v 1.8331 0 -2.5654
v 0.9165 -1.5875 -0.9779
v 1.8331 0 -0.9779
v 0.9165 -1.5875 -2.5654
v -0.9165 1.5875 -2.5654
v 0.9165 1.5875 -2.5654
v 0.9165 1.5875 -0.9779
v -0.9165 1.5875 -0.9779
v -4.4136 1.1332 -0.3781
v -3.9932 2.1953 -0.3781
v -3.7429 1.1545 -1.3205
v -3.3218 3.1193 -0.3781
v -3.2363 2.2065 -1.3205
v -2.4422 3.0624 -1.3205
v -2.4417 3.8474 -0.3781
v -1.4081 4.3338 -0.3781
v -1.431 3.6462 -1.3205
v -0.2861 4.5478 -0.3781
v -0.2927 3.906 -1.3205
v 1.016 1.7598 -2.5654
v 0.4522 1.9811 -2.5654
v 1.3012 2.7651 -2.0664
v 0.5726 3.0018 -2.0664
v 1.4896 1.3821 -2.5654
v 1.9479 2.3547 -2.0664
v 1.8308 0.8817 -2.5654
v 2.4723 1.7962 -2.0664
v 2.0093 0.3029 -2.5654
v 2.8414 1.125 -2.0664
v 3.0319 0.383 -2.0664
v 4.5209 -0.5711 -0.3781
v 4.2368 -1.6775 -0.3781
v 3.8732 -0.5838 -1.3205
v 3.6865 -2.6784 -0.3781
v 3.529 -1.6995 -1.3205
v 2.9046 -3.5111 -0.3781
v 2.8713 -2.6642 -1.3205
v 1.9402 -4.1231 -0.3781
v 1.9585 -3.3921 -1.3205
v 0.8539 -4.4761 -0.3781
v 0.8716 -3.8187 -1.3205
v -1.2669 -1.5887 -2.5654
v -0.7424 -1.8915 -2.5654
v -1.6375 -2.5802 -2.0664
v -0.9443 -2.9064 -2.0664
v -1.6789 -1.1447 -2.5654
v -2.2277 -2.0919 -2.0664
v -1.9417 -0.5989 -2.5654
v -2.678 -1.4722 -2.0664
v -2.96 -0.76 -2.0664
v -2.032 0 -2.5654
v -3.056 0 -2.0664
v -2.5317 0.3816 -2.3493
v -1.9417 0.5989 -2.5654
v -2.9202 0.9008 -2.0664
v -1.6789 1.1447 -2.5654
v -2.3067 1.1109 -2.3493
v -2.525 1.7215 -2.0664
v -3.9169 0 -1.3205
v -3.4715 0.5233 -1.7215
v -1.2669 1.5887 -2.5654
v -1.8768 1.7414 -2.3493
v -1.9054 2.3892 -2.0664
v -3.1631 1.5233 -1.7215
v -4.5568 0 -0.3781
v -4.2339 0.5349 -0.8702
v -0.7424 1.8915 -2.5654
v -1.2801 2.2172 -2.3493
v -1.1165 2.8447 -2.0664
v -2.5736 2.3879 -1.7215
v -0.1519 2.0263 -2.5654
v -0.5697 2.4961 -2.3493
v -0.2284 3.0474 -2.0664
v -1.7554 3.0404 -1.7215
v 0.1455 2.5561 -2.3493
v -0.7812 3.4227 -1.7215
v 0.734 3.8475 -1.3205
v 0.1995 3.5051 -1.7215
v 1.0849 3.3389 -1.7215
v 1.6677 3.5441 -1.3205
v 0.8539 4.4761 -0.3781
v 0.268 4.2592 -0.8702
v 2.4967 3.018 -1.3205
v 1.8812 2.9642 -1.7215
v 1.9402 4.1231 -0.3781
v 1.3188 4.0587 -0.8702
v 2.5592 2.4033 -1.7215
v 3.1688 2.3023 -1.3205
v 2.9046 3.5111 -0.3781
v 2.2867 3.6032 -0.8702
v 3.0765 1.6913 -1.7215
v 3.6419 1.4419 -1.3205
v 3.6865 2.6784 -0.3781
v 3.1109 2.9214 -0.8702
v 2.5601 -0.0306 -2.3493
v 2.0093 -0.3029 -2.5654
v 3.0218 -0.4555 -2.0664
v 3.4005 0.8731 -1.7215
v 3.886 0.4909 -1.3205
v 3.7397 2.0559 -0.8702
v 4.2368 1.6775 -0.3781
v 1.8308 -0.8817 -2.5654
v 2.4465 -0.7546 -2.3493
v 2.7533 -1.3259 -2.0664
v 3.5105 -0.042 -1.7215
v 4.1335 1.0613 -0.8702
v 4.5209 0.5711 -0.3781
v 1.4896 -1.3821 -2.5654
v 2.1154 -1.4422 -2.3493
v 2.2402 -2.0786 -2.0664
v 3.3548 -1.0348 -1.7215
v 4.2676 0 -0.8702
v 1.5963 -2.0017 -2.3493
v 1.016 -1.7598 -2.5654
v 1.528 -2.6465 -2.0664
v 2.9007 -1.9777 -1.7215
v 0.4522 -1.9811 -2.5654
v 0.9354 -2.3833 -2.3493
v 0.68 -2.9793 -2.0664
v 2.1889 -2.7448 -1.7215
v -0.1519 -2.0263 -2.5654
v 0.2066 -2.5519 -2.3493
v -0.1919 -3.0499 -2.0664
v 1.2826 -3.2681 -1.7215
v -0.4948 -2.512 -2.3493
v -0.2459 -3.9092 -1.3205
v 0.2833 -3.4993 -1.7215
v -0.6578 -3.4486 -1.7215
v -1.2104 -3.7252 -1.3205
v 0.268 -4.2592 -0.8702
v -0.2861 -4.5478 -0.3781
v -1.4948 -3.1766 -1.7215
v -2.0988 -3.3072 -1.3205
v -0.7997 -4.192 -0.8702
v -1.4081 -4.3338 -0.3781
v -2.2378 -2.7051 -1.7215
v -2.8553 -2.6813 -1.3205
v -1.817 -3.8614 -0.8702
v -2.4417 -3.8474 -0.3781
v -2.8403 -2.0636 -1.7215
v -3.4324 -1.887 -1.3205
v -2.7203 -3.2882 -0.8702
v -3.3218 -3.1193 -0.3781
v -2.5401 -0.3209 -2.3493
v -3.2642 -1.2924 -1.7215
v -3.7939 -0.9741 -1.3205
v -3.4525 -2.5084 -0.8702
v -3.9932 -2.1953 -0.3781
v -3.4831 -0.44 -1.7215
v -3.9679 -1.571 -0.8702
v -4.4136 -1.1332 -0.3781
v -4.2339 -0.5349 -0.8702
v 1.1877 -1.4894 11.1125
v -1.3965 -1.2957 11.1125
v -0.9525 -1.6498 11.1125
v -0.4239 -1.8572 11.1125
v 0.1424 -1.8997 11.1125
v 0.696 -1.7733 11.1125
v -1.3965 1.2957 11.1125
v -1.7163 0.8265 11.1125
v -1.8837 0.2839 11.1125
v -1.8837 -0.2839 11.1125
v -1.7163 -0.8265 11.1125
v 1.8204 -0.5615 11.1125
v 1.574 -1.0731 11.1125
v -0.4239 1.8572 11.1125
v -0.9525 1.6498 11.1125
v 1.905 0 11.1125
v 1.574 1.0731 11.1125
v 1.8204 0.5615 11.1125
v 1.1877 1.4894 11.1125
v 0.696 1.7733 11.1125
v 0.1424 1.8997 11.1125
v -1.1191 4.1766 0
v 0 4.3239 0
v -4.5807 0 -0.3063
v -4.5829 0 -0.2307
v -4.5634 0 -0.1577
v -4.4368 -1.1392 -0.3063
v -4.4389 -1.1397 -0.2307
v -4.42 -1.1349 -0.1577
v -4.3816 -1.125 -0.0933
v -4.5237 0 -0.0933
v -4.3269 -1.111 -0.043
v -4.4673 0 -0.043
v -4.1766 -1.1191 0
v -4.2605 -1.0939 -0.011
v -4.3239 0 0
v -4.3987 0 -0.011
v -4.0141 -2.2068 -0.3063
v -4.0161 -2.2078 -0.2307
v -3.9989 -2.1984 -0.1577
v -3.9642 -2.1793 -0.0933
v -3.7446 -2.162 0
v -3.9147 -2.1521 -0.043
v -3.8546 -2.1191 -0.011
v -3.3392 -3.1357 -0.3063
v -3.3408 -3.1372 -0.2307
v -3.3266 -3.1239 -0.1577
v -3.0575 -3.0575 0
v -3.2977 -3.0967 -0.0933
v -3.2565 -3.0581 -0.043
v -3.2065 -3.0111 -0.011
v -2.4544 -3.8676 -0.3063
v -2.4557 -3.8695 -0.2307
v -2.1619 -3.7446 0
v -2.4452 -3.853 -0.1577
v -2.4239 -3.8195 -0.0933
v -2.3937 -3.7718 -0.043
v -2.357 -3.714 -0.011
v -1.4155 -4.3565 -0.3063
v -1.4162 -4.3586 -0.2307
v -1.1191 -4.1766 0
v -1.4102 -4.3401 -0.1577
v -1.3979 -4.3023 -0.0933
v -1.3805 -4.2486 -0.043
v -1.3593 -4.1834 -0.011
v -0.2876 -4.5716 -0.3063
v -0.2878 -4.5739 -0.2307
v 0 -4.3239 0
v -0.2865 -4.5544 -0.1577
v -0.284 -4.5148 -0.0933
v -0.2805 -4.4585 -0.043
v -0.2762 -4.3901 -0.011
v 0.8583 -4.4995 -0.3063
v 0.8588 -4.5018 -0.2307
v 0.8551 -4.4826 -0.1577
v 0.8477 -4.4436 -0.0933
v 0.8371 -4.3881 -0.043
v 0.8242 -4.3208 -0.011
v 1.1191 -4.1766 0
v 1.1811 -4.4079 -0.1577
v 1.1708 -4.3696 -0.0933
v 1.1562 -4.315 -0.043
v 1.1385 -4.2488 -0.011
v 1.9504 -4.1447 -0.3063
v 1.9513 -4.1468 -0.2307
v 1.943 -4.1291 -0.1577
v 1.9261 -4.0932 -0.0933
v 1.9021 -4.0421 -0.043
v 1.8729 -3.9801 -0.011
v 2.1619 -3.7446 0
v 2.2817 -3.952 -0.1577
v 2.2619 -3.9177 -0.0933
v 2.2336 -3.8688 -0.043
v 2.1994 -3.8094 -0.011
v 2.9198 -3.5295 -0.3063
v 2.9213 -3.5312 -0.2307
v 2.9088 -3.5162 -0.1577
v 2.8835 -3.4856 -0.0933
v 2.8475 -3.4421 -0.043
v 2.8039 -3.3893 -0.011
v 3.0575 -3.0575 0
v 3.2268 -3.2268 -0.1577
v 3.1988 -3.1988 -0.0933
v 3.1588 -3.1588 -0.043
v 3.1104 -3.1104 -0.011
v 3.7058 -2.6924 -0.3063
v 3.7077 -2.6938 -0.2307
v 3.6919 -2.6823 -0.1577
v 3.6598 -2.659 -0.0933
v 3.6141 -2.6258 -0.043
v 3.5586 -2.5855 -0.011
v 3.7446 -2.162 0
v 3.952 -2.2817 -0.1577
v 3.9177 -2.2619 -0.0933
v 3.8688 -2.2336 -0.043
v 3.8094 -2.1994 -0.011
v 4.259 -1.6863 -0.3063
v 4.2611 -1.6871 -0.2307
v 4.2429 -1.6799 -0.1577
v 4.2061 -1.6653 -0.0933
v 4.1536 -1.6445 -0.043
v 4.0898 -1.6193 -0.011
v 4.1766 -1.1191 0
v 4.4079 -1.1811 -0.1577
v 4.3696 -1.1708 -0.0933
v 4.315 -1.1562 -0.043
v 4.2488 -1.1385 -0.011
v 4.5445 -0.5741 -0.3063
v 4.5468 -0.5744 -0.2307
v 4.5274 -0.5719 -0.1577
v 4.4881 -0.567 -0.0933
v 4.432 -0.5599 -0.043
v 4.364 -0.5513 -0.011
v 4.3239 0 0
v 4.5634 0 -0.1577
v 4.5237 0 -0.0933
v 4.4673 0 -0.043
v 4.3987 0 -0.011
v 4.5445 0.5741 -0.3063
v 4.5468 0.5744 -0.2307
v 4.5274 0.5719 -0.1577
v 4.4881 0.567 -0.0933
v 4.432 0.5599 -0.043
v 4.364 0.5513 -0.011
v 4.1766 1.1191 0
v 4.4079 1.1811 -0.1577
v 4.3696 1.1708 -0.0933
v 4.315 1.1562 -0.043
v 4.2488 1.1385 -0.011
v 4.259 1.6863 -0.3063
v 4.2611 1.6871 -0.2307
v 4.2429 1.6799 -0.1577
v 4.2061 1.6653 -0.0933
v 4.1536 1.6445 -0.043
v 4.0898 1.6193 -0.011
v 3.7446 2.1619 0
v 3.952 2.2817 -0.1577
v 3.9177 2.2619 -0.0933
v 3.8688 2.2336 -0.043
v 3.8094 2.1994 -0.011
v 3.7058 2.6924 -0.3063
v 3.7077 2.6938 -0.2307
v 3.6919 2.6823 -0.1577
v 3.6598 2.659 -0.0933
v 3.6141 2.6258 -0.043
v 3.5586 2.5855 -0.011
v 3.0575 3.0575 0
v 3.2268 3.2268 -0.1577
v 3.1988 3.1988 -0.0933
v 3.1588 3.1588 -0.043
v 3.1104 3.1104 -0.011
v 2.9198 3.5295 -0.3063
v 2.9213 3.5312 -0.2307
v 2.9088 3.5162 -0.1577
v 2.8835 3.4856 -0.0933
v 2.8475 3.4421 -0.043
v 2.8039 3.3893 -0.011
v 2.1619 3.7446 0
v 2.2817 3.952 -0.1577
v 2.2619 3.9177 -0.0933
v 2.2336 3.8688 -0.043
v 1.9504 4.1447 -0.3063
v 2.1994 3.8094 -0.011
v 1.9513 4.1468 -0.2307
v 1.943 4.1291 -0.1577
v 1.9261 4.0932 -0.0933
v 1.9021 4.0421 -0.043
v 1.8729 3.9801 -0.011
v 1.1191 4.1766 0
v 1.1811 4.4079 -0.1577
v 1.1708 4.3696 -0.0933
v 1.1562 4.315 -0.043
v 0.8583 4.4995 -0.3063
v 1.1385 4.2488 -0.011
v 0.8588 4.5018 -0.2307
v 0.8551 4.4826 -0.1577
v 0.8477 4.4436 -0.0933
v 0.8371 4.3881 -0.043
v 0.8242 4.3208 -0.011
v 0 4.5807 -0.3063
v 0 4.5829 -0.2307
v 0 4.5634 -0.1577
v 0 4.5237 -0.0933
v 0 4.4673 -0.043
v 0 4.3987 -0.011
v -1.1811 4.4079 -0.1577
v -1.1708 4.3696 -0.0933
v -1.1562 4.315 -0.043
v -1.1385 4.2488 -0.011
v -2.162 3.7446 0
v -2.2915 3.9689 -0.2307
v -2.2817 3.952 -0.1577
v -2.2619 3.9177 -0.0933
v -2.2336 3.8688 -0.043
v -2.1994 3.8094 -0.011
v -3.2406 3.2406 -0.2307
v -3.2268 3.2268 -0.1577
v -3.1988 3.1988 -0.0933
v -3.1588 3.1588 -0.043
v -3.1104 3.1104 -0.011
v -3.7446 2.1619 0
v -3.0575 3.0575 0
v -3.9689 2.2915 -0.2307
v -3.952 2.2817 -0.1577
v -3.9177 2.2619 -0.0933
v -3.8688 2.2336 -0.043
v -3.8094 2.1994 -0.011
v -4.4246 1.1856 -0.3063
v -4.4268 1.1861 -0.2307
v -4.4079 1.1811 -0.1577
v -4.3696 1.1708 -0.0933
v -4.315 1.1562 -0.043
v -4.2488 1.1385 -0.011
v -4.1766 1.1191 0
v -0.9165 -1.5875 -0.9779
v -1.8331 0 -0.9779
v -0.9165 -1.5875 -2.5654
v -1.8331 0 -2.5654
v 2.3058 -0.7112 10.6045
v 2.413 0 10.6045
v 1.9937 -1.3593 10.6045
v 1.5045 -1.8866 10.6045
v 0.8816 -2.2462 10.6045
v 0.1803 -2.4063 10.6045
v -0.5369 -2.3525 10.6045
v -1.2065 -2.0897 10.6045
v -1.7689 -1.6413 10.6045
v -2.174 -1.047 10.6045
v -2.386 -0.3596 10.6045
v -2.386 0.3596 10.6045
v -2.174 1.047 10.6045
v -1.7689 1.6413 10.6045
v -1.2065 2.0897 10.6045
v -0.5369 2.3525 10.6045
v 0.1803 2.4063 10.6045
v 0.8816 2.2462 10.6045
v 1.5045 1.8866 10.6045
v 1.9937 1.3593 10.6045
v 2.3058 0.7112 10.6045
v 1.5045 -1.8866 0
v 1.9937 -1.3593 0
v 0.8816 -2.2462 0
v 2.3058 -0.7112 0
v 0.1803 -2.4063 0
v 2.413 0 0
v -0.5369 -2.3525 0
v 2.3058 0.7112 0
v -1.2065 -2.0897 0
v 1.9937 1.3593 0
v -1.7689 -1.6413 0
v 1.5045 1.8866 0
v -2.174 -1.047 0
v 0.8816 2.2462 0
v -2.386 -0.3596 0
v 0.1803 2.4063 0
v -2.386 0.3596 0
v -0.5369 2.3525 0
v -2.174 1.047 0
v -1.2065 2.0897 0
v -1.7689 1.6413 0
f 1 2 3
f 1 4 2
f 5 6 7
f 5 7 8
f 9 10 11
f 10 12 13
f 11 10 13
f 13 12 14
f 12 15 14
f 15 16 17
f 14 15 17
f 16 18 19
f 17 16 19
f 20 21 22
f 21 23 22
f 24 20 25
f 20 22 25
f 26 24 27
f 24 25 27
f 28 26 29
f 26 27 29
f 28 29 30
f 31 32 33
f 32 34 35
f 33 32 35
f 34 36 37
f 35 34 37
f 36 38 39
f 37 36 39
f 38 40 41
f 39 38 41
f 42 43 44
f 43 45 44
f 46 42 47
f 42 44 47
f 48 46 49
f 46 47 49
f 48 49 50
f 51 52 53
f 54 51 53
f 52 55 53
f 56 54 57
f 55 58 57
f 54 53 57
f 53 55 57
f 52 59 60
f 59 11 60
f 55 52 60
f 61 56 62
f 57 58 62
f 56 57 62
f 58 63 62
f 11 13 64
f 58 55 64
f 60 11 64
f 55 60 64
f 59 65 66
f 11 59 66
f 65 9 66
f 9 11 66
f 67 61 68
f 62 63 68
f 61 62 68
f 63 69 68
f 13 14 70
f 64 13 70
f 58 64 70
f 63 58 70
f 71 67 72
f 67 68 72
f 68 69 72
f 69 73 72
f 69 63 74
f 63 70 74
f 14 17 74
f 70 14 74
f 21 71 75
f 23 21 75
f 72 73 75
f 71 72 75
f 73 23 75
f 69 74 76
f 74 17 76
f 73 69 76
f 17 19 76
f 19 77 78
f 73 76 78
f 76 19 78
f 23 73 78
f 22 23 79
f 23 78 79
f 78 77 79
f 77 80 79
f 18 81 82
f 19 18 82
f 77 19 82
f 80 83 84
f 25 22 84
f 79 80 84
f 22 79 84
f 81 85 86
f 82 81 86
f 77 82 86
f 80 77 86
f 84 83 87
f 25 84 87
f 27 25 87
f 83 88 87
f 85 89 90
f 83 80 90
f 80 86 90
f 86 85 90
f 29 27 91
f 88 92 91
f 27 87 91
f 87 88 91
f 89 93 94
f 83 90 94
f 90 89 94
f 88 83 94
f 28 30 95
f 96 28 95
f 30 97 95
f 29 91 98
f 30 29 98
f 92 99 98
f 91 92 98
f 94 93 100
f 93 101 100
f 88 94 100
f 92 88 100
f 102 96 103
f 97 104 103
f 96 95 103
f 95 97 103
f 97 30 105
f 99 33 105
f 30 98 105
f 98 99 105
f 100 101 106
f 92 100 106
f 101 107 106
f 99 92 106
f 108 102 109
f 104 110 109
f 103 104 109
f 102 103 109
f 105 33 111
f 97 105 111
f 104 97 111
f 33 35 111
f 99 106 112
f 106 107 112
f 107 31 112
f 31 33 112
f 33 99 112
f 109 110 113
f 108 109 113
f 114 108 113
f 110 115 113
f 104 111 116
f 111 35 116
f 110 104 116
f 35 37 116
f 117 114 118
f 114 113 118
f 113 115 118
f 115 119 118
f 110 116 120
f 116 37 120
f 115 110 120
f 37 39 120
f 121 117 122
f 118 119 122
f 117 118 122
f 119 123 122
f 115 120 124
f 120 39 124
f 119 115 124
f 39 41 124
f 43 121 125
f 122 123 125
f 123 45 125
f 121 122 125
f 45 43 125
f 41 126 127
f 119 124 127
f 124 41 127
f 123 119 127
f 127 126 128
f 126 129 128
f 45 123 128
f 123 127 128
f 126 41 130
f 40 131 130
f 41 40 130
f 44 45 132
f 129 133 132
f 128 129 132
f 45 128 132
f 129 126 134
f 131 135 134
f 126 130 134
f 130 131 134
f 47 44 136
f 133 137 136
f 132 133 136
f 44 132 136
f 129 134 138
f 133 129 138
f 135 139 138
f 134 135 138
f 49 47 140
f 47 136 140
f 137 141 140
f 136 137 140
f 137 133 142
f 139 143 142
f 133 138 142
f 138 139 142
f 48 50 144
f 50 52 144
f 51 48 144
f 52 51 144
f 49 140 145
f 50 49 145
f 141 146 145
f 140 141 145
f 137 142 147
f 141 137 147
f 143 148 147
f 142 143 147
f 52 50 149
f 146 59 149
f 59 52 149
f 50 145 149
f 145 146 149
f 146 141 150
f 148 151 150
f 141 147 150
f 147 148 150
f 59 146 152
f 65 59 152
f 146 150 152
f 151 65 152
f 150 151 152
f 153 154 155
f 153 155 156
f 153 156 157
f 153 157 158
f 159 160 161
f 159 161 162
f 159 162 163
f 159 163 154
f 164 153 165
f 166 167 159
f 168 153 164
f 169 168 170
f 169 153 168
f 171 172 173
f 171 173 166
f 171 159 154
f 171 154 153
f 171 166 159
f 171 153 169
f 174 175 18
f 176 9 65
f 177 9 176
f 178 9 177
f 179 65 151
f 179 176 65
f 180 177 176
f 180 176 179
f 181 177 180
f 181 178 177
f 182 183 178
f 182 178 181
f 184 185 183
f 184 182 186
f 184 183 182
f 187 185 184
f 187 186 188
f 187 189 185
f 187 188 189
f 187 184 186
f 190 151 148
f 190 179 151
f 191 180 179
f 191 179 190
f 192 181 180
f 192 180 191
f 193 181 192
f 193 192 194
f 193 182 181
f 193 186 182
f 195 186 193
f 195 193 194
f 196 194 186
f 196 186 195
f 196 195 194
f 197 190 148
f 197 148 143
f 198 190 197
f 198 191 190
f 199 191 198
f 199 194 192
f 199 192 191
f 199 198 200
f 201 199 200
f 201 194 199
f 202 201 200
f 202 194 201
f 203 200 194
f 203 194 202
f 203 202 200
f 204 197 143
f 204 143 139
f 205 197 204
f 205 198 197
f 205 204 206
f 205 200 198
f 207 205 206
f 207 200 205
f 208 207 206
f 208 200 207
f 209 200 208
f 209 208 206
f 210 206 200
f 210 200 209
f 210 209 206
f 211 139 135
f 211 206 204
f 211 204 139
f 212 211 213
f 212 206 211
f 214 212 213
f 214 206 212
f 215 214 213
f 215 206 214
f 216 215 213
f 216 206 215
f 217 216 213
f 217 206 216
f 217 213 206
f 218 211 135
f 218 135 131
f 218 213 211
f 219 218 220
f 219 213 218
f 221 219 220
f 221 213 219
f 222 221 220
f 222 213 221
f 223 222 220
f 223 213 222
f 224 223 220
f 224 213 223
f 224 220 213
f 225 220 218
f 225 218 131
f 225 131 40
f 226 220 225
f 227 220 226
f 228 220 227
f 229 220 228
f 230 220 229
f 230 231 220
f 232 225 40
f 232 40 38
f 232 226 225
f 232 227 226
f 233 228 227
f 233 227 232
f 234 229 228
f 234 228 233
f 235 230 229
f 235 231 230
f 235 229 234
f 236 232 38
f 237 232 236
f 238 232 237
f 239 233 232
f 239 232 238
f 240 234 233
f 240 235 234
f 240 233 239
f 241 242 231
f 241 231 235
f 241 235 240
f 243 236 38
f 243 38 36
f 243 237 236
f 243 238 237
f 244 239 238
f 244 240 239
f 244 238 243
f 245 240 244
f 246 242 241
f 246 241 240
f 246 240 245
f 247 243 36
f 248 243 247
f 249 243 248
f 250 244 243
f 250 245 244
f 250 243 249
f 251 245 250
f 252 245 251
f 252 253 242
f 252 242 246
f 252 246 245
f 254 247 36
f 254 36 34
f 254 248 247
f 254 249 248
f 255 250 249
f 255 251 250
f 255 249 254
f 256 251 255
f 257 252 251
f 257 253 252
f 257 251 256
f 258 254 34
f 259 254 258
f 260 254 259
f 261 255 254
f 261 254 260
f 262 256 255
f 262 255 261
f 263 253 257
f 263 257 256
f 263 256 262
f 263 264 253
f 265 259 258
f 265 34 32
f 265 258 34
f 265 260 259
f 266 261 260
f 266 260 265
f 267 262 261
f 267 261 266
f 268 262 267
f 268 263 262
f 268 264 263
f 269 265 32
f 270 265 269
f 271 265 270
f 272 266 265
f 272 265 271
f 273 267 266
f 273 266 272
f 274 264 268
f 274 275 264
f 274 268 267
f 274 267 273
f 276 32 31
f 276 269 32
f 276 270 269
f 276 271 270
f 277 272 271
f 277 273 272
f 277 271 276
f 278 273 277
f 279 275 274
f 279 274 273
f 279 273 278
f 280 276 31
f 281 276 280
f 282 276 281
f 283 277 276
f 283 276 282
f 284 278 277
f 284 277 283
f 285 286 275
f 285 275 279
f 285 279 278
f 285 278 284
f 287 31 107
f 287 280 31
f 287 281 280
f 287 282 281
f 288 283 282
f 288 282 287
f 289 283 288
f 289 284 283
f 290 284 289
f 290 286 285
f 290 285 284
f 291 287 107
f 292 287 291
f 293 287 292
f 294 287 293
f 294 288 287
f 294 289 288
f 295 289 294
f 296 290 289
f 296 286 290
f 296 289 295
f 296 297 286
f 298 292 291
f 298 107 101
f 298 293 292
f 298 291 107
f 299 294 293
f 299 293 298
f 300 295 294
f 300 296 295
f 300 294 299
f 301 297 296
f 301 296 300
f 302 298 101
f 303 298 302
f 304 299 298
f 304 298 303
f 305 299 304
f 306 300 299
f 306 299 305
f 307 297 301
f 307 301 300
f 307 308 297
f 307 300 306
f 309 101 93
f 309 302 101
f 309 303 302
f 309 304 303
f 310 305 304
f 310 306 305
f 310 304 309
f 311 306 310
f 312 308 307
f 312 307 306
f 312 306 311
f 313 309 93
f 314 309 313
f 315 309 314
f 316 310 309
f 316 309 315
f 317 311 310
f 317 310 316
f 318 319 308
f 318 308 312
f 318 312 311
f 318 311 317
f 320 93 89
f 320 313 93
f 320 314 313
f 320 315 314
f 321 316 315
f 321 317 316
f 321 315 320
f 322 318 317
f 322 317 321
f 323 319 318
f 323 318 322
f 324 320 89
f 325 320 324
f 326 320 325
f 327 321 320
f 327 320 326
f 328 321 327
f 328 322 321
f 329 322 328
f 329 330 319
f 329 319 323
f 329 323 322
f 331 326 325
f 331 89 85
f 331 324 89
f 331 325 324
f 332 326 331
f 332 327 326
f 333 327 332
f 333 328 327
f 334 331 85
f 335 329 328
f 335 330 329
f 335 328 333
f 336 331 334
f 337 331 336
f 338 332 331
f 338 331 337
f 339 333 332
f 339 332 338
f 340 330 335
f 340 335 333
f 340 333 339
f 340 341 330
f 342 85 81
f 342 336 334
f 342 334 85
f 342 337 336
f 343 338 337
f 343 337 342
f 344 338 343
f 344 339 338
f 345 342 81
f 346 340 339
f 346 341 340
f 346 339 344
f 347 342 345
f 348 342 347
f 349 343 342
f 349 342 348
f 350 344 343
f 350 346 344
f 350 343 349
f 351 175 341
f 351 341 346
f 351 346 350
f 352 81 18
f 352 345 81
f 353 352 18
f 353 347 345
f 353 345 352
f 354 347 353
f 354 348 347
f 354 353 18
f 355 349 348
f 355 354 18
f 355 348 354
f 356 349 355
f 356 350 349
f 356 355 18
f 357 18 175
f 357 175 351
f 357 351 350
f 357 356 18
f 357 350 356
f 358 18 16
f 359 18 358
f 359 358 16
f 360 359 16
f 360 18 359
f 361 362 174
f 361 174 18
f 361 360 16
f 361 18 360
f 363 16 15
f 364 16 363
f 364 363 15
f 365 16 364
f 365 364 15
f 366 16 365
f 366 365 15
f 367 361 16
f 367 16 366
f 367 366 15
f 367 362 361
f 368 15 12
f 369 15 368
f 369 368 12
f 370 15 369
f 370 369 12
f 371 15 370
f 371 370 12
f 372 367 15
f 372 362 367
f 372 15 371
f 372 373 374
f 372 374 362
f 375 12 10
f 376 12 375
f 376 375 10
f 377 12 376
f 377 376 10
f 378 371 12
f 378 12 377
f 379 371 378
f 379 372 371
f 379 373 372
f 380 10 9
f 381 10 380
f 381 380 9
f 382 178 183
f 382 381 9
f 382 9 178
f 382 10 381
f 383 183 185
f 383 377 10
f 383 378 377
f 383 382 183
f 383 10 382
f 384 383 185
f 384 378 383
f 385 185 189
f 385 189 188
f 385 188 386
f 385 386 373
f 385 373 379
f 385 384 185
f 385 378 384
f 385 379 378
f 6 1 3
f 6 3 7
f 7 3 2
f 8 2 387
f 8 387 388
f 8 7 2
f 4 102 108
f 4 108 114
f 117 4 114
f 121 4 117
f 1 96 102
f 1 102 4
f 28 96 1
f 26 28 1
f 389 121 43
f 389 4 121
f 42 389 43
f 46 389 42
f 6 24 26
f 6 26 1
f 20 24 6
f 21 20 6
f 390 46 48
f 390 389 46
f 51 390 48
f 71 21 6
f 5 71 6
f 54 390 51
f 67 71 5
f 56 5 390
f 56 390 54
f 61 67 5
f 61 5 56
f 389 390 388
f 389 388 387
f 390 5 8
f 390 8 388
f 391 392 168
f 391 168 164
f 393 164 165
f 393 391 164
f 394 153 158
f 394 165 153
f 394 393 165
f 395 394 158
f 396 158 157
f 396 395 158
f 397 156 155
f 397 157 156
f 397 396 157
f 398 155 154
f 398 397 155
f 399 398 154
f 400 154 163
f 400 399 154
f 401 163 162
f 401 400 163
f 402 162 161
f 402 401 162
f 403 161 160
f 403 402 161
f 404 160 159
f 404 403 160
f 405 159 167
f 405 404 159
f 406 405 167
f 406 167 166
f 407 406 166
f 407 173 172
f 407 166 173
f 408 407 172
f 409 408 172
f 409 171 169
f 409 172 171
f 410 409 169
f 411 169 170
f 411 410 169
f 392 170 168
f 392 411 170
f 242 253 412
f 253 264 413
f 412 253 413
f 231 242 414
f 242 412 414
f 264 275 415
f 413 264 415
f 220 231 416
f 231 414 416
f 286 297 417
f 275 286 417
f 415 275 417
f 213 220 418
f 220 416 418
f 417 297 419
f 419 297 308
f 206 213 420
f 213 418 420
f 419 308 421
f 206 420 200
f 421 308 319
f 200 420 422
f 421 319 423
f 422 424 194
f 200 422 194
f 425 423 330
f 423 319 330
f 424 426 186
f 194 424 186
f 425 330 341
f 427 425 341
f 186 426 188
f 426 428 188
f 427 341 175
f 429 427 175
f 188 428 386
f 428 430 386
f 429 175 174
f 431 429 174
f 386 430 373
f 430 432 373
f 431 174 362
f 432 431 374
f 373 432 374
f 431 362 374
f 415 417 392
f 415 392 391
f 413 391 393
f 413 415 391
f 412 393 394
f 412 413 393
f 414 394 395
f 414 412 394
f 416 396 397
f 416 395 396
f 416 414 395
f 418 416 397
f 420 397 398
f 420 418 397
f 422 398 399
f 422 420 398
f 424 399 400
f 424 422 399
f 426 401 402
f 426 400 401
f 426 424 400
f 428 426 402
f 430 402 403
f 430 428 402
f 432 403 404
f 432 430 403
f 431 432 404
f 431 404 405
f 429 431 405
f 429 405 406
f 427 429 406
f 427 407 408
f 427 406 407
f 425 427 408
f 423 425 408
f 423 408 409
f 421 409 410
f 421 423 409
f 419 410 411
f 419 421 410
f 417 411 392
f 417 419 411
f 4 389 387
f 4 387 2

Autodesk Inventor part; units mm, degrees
ref_plane "YZ Plane" through (0, 0, 0) normal (1, 0, 0) x (0, 1, 0)
ref_plane "XZ Plane" through (0, 0, 0) normal (0, 1, 0) x (-1, 0, 0)
ref_plane "XY Plane" through (0, 0, 0) normal (0, 0, 1) x (1, 0, 0)
sketch "Sketch1" plane through (0, 0, 0) normal (0, 0, 1) x (1, 0, 0)
  circle A0 centre (0, 0) radius 2.413
  dimension "d0" = 4.826
extrude "Extrusion1" add sketch "Sketch1" along normal blind 11.1125
sketch "Sketch2" plane through (0, 0, 0) normal (0, 1, 0) x (-1, 0, 0)
  line L0 (0, 0) -> (0, -2.5654)
  line L1 (0, 0) -> (4.3239, 0)
  line L2 (0, -2.5654) -> (2.032, -2.5654)
  line L3 (4.3239, 0) -> (4.3239, 3.8864) construction
  arc A0 (4.5568, -0.3781) -> (4.3239, 0) centre (4.3239, -0.2608) ccw
  arc A1 (2.032, -2.5654) -> (4.5568, -0.3781) centre (0.6382, 1.5944) ccw
  line L4 (4.5847, 0.6553) -> (4.5847, -0.2608) construction
  dimension "d3" = 2.5654
  dimension "d6" = 2.032
  dimension "d12" = 4.5847
revolve "Revolution1" add sketch "Sketch2" angle 360 about axis through (0, 0, 0) along (0, 0, -1)
sketch "Sketch3" plane through (0, 0, -2.5654) normal (0, 0, -1) x (-1, 0, 0)
  circle A0 centre (0, 0) radius 2.032 projected
  line L0 (-0.9165, 1.5875) -> (0.9165, 1.5875)
  line L1 (0.9165, 1.5875) -> (1.8331, 0)
  line L2 (1.8331, 0) -> (0.9165, -1.5875)
  line L3 (0.9165, -1.5875) -> (-0.9165, -1.5875)
  line L4 (-0.9165, -1.5875) -> (-1.8331, 0)
  line L5 (-1.8331, 0) -> (-0.9165, 1.5875)
  dimension "d8" = 3.175
extrude "Extrusion2" cut sketch "Sketch3" against normal blind 1.5875 contours L0 L1 L2 L3 L4 L5
chamfer "Chamfer1" distance 0.508 angle 45 1 edges at (-2.413, 0, 11.1125)
thread "Thread1" size "10-32 UNF" class "2A" standard "ANSI Unified Screw Threads" full length
properties part number "10-32 x438 button head" material "Steel"
